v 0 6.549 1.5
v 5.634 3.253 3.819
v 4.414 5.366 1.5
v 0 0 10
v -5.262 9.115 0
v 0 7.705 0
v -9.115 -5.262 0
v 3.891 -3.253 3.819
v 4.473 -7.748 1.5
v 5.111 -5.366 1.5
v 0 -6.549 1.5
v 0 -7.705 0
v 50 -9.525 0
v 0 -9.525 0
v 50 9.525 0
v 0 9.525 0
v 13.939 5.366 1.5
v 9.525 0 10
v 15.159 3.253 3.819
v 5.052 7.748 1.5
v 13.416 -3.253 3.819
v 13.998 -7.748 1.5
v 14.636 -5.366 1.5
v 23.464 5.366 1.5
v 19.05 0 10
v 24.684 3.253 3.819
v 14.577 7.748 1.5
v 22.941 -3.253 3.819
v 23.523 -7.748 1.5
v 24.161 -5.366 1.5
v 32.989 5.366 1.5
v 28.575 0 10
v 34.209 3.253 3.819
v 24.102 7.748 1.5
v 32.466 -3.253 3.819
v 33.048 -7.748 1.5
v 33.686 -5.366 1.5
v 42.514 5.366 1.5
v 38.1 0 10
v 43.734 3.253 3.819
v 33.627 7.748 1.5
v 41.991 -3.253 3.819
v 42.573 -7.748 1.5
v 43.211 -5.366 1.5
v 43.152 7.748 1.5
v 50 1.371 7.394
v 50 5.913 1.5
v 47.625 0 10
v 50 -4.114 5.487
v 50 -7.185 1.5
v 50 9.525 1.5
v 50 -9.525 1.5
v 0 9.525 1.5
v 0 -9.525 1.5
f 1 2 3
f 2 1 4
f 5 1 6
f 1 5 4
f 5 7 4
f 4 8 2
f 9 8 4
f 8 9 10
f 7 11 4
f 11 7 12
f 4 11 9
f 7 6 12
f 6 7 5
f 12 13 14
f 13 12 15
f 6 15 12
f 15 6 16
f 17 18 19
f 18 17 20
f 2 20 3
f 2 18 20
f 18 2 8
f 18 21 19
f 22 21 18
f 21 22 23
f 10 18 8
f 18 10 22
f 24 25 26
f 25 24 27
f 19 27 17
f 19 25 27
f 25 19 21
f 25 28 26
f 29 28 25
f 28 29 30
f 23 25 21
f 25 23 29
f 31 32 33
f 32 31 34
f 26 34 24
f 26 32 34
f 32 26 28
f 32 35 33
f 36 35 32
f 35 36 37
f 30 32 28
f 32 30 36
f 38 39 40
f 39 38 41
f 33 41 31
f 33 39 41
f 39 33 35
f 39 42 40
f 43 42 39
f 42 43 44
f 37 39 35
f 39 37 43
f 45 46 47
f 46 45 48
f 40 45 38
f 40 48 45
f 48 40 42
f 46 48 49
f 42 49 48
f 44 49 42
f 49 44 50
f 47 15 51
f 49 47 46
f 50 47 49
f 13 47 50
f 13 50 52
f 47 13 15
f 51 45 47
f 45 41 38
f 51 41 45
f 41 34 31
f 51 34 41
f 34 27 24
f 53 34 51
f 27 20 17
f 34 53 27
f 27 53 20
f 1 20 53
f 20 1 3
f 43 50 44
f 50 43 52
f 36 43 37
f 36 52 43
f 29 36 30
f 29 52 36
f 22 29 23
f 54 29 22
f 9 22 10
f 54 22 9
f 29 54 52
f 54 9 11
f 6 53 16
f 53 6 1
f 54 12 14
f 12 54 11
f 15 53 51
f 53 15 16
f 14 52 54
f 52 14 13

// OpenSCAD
$r = 19.05 / 2;
$r2 = 11 / 2;
$d = 1.5;
$fn = 4;
$links = 5;

difference() {
    union() {
for (i = [0:$links]) {
    
     translate([i * $r, 0, 5]) {
        rotate([0, 0, 30]) {
            cylinder(10, $r+1, 0, true);
        }
     }
}
translate([0, -$r, 0]) {
     cube([50, $r*2 , $d], false);
}
}
translate([-10, 0, 0]) {
    //cube([20, 20, 20], true);
}
translate([($links) * $r -$r + 21.9, 0, 0]) {
    cube([20, 20, 20], true);
}
}
